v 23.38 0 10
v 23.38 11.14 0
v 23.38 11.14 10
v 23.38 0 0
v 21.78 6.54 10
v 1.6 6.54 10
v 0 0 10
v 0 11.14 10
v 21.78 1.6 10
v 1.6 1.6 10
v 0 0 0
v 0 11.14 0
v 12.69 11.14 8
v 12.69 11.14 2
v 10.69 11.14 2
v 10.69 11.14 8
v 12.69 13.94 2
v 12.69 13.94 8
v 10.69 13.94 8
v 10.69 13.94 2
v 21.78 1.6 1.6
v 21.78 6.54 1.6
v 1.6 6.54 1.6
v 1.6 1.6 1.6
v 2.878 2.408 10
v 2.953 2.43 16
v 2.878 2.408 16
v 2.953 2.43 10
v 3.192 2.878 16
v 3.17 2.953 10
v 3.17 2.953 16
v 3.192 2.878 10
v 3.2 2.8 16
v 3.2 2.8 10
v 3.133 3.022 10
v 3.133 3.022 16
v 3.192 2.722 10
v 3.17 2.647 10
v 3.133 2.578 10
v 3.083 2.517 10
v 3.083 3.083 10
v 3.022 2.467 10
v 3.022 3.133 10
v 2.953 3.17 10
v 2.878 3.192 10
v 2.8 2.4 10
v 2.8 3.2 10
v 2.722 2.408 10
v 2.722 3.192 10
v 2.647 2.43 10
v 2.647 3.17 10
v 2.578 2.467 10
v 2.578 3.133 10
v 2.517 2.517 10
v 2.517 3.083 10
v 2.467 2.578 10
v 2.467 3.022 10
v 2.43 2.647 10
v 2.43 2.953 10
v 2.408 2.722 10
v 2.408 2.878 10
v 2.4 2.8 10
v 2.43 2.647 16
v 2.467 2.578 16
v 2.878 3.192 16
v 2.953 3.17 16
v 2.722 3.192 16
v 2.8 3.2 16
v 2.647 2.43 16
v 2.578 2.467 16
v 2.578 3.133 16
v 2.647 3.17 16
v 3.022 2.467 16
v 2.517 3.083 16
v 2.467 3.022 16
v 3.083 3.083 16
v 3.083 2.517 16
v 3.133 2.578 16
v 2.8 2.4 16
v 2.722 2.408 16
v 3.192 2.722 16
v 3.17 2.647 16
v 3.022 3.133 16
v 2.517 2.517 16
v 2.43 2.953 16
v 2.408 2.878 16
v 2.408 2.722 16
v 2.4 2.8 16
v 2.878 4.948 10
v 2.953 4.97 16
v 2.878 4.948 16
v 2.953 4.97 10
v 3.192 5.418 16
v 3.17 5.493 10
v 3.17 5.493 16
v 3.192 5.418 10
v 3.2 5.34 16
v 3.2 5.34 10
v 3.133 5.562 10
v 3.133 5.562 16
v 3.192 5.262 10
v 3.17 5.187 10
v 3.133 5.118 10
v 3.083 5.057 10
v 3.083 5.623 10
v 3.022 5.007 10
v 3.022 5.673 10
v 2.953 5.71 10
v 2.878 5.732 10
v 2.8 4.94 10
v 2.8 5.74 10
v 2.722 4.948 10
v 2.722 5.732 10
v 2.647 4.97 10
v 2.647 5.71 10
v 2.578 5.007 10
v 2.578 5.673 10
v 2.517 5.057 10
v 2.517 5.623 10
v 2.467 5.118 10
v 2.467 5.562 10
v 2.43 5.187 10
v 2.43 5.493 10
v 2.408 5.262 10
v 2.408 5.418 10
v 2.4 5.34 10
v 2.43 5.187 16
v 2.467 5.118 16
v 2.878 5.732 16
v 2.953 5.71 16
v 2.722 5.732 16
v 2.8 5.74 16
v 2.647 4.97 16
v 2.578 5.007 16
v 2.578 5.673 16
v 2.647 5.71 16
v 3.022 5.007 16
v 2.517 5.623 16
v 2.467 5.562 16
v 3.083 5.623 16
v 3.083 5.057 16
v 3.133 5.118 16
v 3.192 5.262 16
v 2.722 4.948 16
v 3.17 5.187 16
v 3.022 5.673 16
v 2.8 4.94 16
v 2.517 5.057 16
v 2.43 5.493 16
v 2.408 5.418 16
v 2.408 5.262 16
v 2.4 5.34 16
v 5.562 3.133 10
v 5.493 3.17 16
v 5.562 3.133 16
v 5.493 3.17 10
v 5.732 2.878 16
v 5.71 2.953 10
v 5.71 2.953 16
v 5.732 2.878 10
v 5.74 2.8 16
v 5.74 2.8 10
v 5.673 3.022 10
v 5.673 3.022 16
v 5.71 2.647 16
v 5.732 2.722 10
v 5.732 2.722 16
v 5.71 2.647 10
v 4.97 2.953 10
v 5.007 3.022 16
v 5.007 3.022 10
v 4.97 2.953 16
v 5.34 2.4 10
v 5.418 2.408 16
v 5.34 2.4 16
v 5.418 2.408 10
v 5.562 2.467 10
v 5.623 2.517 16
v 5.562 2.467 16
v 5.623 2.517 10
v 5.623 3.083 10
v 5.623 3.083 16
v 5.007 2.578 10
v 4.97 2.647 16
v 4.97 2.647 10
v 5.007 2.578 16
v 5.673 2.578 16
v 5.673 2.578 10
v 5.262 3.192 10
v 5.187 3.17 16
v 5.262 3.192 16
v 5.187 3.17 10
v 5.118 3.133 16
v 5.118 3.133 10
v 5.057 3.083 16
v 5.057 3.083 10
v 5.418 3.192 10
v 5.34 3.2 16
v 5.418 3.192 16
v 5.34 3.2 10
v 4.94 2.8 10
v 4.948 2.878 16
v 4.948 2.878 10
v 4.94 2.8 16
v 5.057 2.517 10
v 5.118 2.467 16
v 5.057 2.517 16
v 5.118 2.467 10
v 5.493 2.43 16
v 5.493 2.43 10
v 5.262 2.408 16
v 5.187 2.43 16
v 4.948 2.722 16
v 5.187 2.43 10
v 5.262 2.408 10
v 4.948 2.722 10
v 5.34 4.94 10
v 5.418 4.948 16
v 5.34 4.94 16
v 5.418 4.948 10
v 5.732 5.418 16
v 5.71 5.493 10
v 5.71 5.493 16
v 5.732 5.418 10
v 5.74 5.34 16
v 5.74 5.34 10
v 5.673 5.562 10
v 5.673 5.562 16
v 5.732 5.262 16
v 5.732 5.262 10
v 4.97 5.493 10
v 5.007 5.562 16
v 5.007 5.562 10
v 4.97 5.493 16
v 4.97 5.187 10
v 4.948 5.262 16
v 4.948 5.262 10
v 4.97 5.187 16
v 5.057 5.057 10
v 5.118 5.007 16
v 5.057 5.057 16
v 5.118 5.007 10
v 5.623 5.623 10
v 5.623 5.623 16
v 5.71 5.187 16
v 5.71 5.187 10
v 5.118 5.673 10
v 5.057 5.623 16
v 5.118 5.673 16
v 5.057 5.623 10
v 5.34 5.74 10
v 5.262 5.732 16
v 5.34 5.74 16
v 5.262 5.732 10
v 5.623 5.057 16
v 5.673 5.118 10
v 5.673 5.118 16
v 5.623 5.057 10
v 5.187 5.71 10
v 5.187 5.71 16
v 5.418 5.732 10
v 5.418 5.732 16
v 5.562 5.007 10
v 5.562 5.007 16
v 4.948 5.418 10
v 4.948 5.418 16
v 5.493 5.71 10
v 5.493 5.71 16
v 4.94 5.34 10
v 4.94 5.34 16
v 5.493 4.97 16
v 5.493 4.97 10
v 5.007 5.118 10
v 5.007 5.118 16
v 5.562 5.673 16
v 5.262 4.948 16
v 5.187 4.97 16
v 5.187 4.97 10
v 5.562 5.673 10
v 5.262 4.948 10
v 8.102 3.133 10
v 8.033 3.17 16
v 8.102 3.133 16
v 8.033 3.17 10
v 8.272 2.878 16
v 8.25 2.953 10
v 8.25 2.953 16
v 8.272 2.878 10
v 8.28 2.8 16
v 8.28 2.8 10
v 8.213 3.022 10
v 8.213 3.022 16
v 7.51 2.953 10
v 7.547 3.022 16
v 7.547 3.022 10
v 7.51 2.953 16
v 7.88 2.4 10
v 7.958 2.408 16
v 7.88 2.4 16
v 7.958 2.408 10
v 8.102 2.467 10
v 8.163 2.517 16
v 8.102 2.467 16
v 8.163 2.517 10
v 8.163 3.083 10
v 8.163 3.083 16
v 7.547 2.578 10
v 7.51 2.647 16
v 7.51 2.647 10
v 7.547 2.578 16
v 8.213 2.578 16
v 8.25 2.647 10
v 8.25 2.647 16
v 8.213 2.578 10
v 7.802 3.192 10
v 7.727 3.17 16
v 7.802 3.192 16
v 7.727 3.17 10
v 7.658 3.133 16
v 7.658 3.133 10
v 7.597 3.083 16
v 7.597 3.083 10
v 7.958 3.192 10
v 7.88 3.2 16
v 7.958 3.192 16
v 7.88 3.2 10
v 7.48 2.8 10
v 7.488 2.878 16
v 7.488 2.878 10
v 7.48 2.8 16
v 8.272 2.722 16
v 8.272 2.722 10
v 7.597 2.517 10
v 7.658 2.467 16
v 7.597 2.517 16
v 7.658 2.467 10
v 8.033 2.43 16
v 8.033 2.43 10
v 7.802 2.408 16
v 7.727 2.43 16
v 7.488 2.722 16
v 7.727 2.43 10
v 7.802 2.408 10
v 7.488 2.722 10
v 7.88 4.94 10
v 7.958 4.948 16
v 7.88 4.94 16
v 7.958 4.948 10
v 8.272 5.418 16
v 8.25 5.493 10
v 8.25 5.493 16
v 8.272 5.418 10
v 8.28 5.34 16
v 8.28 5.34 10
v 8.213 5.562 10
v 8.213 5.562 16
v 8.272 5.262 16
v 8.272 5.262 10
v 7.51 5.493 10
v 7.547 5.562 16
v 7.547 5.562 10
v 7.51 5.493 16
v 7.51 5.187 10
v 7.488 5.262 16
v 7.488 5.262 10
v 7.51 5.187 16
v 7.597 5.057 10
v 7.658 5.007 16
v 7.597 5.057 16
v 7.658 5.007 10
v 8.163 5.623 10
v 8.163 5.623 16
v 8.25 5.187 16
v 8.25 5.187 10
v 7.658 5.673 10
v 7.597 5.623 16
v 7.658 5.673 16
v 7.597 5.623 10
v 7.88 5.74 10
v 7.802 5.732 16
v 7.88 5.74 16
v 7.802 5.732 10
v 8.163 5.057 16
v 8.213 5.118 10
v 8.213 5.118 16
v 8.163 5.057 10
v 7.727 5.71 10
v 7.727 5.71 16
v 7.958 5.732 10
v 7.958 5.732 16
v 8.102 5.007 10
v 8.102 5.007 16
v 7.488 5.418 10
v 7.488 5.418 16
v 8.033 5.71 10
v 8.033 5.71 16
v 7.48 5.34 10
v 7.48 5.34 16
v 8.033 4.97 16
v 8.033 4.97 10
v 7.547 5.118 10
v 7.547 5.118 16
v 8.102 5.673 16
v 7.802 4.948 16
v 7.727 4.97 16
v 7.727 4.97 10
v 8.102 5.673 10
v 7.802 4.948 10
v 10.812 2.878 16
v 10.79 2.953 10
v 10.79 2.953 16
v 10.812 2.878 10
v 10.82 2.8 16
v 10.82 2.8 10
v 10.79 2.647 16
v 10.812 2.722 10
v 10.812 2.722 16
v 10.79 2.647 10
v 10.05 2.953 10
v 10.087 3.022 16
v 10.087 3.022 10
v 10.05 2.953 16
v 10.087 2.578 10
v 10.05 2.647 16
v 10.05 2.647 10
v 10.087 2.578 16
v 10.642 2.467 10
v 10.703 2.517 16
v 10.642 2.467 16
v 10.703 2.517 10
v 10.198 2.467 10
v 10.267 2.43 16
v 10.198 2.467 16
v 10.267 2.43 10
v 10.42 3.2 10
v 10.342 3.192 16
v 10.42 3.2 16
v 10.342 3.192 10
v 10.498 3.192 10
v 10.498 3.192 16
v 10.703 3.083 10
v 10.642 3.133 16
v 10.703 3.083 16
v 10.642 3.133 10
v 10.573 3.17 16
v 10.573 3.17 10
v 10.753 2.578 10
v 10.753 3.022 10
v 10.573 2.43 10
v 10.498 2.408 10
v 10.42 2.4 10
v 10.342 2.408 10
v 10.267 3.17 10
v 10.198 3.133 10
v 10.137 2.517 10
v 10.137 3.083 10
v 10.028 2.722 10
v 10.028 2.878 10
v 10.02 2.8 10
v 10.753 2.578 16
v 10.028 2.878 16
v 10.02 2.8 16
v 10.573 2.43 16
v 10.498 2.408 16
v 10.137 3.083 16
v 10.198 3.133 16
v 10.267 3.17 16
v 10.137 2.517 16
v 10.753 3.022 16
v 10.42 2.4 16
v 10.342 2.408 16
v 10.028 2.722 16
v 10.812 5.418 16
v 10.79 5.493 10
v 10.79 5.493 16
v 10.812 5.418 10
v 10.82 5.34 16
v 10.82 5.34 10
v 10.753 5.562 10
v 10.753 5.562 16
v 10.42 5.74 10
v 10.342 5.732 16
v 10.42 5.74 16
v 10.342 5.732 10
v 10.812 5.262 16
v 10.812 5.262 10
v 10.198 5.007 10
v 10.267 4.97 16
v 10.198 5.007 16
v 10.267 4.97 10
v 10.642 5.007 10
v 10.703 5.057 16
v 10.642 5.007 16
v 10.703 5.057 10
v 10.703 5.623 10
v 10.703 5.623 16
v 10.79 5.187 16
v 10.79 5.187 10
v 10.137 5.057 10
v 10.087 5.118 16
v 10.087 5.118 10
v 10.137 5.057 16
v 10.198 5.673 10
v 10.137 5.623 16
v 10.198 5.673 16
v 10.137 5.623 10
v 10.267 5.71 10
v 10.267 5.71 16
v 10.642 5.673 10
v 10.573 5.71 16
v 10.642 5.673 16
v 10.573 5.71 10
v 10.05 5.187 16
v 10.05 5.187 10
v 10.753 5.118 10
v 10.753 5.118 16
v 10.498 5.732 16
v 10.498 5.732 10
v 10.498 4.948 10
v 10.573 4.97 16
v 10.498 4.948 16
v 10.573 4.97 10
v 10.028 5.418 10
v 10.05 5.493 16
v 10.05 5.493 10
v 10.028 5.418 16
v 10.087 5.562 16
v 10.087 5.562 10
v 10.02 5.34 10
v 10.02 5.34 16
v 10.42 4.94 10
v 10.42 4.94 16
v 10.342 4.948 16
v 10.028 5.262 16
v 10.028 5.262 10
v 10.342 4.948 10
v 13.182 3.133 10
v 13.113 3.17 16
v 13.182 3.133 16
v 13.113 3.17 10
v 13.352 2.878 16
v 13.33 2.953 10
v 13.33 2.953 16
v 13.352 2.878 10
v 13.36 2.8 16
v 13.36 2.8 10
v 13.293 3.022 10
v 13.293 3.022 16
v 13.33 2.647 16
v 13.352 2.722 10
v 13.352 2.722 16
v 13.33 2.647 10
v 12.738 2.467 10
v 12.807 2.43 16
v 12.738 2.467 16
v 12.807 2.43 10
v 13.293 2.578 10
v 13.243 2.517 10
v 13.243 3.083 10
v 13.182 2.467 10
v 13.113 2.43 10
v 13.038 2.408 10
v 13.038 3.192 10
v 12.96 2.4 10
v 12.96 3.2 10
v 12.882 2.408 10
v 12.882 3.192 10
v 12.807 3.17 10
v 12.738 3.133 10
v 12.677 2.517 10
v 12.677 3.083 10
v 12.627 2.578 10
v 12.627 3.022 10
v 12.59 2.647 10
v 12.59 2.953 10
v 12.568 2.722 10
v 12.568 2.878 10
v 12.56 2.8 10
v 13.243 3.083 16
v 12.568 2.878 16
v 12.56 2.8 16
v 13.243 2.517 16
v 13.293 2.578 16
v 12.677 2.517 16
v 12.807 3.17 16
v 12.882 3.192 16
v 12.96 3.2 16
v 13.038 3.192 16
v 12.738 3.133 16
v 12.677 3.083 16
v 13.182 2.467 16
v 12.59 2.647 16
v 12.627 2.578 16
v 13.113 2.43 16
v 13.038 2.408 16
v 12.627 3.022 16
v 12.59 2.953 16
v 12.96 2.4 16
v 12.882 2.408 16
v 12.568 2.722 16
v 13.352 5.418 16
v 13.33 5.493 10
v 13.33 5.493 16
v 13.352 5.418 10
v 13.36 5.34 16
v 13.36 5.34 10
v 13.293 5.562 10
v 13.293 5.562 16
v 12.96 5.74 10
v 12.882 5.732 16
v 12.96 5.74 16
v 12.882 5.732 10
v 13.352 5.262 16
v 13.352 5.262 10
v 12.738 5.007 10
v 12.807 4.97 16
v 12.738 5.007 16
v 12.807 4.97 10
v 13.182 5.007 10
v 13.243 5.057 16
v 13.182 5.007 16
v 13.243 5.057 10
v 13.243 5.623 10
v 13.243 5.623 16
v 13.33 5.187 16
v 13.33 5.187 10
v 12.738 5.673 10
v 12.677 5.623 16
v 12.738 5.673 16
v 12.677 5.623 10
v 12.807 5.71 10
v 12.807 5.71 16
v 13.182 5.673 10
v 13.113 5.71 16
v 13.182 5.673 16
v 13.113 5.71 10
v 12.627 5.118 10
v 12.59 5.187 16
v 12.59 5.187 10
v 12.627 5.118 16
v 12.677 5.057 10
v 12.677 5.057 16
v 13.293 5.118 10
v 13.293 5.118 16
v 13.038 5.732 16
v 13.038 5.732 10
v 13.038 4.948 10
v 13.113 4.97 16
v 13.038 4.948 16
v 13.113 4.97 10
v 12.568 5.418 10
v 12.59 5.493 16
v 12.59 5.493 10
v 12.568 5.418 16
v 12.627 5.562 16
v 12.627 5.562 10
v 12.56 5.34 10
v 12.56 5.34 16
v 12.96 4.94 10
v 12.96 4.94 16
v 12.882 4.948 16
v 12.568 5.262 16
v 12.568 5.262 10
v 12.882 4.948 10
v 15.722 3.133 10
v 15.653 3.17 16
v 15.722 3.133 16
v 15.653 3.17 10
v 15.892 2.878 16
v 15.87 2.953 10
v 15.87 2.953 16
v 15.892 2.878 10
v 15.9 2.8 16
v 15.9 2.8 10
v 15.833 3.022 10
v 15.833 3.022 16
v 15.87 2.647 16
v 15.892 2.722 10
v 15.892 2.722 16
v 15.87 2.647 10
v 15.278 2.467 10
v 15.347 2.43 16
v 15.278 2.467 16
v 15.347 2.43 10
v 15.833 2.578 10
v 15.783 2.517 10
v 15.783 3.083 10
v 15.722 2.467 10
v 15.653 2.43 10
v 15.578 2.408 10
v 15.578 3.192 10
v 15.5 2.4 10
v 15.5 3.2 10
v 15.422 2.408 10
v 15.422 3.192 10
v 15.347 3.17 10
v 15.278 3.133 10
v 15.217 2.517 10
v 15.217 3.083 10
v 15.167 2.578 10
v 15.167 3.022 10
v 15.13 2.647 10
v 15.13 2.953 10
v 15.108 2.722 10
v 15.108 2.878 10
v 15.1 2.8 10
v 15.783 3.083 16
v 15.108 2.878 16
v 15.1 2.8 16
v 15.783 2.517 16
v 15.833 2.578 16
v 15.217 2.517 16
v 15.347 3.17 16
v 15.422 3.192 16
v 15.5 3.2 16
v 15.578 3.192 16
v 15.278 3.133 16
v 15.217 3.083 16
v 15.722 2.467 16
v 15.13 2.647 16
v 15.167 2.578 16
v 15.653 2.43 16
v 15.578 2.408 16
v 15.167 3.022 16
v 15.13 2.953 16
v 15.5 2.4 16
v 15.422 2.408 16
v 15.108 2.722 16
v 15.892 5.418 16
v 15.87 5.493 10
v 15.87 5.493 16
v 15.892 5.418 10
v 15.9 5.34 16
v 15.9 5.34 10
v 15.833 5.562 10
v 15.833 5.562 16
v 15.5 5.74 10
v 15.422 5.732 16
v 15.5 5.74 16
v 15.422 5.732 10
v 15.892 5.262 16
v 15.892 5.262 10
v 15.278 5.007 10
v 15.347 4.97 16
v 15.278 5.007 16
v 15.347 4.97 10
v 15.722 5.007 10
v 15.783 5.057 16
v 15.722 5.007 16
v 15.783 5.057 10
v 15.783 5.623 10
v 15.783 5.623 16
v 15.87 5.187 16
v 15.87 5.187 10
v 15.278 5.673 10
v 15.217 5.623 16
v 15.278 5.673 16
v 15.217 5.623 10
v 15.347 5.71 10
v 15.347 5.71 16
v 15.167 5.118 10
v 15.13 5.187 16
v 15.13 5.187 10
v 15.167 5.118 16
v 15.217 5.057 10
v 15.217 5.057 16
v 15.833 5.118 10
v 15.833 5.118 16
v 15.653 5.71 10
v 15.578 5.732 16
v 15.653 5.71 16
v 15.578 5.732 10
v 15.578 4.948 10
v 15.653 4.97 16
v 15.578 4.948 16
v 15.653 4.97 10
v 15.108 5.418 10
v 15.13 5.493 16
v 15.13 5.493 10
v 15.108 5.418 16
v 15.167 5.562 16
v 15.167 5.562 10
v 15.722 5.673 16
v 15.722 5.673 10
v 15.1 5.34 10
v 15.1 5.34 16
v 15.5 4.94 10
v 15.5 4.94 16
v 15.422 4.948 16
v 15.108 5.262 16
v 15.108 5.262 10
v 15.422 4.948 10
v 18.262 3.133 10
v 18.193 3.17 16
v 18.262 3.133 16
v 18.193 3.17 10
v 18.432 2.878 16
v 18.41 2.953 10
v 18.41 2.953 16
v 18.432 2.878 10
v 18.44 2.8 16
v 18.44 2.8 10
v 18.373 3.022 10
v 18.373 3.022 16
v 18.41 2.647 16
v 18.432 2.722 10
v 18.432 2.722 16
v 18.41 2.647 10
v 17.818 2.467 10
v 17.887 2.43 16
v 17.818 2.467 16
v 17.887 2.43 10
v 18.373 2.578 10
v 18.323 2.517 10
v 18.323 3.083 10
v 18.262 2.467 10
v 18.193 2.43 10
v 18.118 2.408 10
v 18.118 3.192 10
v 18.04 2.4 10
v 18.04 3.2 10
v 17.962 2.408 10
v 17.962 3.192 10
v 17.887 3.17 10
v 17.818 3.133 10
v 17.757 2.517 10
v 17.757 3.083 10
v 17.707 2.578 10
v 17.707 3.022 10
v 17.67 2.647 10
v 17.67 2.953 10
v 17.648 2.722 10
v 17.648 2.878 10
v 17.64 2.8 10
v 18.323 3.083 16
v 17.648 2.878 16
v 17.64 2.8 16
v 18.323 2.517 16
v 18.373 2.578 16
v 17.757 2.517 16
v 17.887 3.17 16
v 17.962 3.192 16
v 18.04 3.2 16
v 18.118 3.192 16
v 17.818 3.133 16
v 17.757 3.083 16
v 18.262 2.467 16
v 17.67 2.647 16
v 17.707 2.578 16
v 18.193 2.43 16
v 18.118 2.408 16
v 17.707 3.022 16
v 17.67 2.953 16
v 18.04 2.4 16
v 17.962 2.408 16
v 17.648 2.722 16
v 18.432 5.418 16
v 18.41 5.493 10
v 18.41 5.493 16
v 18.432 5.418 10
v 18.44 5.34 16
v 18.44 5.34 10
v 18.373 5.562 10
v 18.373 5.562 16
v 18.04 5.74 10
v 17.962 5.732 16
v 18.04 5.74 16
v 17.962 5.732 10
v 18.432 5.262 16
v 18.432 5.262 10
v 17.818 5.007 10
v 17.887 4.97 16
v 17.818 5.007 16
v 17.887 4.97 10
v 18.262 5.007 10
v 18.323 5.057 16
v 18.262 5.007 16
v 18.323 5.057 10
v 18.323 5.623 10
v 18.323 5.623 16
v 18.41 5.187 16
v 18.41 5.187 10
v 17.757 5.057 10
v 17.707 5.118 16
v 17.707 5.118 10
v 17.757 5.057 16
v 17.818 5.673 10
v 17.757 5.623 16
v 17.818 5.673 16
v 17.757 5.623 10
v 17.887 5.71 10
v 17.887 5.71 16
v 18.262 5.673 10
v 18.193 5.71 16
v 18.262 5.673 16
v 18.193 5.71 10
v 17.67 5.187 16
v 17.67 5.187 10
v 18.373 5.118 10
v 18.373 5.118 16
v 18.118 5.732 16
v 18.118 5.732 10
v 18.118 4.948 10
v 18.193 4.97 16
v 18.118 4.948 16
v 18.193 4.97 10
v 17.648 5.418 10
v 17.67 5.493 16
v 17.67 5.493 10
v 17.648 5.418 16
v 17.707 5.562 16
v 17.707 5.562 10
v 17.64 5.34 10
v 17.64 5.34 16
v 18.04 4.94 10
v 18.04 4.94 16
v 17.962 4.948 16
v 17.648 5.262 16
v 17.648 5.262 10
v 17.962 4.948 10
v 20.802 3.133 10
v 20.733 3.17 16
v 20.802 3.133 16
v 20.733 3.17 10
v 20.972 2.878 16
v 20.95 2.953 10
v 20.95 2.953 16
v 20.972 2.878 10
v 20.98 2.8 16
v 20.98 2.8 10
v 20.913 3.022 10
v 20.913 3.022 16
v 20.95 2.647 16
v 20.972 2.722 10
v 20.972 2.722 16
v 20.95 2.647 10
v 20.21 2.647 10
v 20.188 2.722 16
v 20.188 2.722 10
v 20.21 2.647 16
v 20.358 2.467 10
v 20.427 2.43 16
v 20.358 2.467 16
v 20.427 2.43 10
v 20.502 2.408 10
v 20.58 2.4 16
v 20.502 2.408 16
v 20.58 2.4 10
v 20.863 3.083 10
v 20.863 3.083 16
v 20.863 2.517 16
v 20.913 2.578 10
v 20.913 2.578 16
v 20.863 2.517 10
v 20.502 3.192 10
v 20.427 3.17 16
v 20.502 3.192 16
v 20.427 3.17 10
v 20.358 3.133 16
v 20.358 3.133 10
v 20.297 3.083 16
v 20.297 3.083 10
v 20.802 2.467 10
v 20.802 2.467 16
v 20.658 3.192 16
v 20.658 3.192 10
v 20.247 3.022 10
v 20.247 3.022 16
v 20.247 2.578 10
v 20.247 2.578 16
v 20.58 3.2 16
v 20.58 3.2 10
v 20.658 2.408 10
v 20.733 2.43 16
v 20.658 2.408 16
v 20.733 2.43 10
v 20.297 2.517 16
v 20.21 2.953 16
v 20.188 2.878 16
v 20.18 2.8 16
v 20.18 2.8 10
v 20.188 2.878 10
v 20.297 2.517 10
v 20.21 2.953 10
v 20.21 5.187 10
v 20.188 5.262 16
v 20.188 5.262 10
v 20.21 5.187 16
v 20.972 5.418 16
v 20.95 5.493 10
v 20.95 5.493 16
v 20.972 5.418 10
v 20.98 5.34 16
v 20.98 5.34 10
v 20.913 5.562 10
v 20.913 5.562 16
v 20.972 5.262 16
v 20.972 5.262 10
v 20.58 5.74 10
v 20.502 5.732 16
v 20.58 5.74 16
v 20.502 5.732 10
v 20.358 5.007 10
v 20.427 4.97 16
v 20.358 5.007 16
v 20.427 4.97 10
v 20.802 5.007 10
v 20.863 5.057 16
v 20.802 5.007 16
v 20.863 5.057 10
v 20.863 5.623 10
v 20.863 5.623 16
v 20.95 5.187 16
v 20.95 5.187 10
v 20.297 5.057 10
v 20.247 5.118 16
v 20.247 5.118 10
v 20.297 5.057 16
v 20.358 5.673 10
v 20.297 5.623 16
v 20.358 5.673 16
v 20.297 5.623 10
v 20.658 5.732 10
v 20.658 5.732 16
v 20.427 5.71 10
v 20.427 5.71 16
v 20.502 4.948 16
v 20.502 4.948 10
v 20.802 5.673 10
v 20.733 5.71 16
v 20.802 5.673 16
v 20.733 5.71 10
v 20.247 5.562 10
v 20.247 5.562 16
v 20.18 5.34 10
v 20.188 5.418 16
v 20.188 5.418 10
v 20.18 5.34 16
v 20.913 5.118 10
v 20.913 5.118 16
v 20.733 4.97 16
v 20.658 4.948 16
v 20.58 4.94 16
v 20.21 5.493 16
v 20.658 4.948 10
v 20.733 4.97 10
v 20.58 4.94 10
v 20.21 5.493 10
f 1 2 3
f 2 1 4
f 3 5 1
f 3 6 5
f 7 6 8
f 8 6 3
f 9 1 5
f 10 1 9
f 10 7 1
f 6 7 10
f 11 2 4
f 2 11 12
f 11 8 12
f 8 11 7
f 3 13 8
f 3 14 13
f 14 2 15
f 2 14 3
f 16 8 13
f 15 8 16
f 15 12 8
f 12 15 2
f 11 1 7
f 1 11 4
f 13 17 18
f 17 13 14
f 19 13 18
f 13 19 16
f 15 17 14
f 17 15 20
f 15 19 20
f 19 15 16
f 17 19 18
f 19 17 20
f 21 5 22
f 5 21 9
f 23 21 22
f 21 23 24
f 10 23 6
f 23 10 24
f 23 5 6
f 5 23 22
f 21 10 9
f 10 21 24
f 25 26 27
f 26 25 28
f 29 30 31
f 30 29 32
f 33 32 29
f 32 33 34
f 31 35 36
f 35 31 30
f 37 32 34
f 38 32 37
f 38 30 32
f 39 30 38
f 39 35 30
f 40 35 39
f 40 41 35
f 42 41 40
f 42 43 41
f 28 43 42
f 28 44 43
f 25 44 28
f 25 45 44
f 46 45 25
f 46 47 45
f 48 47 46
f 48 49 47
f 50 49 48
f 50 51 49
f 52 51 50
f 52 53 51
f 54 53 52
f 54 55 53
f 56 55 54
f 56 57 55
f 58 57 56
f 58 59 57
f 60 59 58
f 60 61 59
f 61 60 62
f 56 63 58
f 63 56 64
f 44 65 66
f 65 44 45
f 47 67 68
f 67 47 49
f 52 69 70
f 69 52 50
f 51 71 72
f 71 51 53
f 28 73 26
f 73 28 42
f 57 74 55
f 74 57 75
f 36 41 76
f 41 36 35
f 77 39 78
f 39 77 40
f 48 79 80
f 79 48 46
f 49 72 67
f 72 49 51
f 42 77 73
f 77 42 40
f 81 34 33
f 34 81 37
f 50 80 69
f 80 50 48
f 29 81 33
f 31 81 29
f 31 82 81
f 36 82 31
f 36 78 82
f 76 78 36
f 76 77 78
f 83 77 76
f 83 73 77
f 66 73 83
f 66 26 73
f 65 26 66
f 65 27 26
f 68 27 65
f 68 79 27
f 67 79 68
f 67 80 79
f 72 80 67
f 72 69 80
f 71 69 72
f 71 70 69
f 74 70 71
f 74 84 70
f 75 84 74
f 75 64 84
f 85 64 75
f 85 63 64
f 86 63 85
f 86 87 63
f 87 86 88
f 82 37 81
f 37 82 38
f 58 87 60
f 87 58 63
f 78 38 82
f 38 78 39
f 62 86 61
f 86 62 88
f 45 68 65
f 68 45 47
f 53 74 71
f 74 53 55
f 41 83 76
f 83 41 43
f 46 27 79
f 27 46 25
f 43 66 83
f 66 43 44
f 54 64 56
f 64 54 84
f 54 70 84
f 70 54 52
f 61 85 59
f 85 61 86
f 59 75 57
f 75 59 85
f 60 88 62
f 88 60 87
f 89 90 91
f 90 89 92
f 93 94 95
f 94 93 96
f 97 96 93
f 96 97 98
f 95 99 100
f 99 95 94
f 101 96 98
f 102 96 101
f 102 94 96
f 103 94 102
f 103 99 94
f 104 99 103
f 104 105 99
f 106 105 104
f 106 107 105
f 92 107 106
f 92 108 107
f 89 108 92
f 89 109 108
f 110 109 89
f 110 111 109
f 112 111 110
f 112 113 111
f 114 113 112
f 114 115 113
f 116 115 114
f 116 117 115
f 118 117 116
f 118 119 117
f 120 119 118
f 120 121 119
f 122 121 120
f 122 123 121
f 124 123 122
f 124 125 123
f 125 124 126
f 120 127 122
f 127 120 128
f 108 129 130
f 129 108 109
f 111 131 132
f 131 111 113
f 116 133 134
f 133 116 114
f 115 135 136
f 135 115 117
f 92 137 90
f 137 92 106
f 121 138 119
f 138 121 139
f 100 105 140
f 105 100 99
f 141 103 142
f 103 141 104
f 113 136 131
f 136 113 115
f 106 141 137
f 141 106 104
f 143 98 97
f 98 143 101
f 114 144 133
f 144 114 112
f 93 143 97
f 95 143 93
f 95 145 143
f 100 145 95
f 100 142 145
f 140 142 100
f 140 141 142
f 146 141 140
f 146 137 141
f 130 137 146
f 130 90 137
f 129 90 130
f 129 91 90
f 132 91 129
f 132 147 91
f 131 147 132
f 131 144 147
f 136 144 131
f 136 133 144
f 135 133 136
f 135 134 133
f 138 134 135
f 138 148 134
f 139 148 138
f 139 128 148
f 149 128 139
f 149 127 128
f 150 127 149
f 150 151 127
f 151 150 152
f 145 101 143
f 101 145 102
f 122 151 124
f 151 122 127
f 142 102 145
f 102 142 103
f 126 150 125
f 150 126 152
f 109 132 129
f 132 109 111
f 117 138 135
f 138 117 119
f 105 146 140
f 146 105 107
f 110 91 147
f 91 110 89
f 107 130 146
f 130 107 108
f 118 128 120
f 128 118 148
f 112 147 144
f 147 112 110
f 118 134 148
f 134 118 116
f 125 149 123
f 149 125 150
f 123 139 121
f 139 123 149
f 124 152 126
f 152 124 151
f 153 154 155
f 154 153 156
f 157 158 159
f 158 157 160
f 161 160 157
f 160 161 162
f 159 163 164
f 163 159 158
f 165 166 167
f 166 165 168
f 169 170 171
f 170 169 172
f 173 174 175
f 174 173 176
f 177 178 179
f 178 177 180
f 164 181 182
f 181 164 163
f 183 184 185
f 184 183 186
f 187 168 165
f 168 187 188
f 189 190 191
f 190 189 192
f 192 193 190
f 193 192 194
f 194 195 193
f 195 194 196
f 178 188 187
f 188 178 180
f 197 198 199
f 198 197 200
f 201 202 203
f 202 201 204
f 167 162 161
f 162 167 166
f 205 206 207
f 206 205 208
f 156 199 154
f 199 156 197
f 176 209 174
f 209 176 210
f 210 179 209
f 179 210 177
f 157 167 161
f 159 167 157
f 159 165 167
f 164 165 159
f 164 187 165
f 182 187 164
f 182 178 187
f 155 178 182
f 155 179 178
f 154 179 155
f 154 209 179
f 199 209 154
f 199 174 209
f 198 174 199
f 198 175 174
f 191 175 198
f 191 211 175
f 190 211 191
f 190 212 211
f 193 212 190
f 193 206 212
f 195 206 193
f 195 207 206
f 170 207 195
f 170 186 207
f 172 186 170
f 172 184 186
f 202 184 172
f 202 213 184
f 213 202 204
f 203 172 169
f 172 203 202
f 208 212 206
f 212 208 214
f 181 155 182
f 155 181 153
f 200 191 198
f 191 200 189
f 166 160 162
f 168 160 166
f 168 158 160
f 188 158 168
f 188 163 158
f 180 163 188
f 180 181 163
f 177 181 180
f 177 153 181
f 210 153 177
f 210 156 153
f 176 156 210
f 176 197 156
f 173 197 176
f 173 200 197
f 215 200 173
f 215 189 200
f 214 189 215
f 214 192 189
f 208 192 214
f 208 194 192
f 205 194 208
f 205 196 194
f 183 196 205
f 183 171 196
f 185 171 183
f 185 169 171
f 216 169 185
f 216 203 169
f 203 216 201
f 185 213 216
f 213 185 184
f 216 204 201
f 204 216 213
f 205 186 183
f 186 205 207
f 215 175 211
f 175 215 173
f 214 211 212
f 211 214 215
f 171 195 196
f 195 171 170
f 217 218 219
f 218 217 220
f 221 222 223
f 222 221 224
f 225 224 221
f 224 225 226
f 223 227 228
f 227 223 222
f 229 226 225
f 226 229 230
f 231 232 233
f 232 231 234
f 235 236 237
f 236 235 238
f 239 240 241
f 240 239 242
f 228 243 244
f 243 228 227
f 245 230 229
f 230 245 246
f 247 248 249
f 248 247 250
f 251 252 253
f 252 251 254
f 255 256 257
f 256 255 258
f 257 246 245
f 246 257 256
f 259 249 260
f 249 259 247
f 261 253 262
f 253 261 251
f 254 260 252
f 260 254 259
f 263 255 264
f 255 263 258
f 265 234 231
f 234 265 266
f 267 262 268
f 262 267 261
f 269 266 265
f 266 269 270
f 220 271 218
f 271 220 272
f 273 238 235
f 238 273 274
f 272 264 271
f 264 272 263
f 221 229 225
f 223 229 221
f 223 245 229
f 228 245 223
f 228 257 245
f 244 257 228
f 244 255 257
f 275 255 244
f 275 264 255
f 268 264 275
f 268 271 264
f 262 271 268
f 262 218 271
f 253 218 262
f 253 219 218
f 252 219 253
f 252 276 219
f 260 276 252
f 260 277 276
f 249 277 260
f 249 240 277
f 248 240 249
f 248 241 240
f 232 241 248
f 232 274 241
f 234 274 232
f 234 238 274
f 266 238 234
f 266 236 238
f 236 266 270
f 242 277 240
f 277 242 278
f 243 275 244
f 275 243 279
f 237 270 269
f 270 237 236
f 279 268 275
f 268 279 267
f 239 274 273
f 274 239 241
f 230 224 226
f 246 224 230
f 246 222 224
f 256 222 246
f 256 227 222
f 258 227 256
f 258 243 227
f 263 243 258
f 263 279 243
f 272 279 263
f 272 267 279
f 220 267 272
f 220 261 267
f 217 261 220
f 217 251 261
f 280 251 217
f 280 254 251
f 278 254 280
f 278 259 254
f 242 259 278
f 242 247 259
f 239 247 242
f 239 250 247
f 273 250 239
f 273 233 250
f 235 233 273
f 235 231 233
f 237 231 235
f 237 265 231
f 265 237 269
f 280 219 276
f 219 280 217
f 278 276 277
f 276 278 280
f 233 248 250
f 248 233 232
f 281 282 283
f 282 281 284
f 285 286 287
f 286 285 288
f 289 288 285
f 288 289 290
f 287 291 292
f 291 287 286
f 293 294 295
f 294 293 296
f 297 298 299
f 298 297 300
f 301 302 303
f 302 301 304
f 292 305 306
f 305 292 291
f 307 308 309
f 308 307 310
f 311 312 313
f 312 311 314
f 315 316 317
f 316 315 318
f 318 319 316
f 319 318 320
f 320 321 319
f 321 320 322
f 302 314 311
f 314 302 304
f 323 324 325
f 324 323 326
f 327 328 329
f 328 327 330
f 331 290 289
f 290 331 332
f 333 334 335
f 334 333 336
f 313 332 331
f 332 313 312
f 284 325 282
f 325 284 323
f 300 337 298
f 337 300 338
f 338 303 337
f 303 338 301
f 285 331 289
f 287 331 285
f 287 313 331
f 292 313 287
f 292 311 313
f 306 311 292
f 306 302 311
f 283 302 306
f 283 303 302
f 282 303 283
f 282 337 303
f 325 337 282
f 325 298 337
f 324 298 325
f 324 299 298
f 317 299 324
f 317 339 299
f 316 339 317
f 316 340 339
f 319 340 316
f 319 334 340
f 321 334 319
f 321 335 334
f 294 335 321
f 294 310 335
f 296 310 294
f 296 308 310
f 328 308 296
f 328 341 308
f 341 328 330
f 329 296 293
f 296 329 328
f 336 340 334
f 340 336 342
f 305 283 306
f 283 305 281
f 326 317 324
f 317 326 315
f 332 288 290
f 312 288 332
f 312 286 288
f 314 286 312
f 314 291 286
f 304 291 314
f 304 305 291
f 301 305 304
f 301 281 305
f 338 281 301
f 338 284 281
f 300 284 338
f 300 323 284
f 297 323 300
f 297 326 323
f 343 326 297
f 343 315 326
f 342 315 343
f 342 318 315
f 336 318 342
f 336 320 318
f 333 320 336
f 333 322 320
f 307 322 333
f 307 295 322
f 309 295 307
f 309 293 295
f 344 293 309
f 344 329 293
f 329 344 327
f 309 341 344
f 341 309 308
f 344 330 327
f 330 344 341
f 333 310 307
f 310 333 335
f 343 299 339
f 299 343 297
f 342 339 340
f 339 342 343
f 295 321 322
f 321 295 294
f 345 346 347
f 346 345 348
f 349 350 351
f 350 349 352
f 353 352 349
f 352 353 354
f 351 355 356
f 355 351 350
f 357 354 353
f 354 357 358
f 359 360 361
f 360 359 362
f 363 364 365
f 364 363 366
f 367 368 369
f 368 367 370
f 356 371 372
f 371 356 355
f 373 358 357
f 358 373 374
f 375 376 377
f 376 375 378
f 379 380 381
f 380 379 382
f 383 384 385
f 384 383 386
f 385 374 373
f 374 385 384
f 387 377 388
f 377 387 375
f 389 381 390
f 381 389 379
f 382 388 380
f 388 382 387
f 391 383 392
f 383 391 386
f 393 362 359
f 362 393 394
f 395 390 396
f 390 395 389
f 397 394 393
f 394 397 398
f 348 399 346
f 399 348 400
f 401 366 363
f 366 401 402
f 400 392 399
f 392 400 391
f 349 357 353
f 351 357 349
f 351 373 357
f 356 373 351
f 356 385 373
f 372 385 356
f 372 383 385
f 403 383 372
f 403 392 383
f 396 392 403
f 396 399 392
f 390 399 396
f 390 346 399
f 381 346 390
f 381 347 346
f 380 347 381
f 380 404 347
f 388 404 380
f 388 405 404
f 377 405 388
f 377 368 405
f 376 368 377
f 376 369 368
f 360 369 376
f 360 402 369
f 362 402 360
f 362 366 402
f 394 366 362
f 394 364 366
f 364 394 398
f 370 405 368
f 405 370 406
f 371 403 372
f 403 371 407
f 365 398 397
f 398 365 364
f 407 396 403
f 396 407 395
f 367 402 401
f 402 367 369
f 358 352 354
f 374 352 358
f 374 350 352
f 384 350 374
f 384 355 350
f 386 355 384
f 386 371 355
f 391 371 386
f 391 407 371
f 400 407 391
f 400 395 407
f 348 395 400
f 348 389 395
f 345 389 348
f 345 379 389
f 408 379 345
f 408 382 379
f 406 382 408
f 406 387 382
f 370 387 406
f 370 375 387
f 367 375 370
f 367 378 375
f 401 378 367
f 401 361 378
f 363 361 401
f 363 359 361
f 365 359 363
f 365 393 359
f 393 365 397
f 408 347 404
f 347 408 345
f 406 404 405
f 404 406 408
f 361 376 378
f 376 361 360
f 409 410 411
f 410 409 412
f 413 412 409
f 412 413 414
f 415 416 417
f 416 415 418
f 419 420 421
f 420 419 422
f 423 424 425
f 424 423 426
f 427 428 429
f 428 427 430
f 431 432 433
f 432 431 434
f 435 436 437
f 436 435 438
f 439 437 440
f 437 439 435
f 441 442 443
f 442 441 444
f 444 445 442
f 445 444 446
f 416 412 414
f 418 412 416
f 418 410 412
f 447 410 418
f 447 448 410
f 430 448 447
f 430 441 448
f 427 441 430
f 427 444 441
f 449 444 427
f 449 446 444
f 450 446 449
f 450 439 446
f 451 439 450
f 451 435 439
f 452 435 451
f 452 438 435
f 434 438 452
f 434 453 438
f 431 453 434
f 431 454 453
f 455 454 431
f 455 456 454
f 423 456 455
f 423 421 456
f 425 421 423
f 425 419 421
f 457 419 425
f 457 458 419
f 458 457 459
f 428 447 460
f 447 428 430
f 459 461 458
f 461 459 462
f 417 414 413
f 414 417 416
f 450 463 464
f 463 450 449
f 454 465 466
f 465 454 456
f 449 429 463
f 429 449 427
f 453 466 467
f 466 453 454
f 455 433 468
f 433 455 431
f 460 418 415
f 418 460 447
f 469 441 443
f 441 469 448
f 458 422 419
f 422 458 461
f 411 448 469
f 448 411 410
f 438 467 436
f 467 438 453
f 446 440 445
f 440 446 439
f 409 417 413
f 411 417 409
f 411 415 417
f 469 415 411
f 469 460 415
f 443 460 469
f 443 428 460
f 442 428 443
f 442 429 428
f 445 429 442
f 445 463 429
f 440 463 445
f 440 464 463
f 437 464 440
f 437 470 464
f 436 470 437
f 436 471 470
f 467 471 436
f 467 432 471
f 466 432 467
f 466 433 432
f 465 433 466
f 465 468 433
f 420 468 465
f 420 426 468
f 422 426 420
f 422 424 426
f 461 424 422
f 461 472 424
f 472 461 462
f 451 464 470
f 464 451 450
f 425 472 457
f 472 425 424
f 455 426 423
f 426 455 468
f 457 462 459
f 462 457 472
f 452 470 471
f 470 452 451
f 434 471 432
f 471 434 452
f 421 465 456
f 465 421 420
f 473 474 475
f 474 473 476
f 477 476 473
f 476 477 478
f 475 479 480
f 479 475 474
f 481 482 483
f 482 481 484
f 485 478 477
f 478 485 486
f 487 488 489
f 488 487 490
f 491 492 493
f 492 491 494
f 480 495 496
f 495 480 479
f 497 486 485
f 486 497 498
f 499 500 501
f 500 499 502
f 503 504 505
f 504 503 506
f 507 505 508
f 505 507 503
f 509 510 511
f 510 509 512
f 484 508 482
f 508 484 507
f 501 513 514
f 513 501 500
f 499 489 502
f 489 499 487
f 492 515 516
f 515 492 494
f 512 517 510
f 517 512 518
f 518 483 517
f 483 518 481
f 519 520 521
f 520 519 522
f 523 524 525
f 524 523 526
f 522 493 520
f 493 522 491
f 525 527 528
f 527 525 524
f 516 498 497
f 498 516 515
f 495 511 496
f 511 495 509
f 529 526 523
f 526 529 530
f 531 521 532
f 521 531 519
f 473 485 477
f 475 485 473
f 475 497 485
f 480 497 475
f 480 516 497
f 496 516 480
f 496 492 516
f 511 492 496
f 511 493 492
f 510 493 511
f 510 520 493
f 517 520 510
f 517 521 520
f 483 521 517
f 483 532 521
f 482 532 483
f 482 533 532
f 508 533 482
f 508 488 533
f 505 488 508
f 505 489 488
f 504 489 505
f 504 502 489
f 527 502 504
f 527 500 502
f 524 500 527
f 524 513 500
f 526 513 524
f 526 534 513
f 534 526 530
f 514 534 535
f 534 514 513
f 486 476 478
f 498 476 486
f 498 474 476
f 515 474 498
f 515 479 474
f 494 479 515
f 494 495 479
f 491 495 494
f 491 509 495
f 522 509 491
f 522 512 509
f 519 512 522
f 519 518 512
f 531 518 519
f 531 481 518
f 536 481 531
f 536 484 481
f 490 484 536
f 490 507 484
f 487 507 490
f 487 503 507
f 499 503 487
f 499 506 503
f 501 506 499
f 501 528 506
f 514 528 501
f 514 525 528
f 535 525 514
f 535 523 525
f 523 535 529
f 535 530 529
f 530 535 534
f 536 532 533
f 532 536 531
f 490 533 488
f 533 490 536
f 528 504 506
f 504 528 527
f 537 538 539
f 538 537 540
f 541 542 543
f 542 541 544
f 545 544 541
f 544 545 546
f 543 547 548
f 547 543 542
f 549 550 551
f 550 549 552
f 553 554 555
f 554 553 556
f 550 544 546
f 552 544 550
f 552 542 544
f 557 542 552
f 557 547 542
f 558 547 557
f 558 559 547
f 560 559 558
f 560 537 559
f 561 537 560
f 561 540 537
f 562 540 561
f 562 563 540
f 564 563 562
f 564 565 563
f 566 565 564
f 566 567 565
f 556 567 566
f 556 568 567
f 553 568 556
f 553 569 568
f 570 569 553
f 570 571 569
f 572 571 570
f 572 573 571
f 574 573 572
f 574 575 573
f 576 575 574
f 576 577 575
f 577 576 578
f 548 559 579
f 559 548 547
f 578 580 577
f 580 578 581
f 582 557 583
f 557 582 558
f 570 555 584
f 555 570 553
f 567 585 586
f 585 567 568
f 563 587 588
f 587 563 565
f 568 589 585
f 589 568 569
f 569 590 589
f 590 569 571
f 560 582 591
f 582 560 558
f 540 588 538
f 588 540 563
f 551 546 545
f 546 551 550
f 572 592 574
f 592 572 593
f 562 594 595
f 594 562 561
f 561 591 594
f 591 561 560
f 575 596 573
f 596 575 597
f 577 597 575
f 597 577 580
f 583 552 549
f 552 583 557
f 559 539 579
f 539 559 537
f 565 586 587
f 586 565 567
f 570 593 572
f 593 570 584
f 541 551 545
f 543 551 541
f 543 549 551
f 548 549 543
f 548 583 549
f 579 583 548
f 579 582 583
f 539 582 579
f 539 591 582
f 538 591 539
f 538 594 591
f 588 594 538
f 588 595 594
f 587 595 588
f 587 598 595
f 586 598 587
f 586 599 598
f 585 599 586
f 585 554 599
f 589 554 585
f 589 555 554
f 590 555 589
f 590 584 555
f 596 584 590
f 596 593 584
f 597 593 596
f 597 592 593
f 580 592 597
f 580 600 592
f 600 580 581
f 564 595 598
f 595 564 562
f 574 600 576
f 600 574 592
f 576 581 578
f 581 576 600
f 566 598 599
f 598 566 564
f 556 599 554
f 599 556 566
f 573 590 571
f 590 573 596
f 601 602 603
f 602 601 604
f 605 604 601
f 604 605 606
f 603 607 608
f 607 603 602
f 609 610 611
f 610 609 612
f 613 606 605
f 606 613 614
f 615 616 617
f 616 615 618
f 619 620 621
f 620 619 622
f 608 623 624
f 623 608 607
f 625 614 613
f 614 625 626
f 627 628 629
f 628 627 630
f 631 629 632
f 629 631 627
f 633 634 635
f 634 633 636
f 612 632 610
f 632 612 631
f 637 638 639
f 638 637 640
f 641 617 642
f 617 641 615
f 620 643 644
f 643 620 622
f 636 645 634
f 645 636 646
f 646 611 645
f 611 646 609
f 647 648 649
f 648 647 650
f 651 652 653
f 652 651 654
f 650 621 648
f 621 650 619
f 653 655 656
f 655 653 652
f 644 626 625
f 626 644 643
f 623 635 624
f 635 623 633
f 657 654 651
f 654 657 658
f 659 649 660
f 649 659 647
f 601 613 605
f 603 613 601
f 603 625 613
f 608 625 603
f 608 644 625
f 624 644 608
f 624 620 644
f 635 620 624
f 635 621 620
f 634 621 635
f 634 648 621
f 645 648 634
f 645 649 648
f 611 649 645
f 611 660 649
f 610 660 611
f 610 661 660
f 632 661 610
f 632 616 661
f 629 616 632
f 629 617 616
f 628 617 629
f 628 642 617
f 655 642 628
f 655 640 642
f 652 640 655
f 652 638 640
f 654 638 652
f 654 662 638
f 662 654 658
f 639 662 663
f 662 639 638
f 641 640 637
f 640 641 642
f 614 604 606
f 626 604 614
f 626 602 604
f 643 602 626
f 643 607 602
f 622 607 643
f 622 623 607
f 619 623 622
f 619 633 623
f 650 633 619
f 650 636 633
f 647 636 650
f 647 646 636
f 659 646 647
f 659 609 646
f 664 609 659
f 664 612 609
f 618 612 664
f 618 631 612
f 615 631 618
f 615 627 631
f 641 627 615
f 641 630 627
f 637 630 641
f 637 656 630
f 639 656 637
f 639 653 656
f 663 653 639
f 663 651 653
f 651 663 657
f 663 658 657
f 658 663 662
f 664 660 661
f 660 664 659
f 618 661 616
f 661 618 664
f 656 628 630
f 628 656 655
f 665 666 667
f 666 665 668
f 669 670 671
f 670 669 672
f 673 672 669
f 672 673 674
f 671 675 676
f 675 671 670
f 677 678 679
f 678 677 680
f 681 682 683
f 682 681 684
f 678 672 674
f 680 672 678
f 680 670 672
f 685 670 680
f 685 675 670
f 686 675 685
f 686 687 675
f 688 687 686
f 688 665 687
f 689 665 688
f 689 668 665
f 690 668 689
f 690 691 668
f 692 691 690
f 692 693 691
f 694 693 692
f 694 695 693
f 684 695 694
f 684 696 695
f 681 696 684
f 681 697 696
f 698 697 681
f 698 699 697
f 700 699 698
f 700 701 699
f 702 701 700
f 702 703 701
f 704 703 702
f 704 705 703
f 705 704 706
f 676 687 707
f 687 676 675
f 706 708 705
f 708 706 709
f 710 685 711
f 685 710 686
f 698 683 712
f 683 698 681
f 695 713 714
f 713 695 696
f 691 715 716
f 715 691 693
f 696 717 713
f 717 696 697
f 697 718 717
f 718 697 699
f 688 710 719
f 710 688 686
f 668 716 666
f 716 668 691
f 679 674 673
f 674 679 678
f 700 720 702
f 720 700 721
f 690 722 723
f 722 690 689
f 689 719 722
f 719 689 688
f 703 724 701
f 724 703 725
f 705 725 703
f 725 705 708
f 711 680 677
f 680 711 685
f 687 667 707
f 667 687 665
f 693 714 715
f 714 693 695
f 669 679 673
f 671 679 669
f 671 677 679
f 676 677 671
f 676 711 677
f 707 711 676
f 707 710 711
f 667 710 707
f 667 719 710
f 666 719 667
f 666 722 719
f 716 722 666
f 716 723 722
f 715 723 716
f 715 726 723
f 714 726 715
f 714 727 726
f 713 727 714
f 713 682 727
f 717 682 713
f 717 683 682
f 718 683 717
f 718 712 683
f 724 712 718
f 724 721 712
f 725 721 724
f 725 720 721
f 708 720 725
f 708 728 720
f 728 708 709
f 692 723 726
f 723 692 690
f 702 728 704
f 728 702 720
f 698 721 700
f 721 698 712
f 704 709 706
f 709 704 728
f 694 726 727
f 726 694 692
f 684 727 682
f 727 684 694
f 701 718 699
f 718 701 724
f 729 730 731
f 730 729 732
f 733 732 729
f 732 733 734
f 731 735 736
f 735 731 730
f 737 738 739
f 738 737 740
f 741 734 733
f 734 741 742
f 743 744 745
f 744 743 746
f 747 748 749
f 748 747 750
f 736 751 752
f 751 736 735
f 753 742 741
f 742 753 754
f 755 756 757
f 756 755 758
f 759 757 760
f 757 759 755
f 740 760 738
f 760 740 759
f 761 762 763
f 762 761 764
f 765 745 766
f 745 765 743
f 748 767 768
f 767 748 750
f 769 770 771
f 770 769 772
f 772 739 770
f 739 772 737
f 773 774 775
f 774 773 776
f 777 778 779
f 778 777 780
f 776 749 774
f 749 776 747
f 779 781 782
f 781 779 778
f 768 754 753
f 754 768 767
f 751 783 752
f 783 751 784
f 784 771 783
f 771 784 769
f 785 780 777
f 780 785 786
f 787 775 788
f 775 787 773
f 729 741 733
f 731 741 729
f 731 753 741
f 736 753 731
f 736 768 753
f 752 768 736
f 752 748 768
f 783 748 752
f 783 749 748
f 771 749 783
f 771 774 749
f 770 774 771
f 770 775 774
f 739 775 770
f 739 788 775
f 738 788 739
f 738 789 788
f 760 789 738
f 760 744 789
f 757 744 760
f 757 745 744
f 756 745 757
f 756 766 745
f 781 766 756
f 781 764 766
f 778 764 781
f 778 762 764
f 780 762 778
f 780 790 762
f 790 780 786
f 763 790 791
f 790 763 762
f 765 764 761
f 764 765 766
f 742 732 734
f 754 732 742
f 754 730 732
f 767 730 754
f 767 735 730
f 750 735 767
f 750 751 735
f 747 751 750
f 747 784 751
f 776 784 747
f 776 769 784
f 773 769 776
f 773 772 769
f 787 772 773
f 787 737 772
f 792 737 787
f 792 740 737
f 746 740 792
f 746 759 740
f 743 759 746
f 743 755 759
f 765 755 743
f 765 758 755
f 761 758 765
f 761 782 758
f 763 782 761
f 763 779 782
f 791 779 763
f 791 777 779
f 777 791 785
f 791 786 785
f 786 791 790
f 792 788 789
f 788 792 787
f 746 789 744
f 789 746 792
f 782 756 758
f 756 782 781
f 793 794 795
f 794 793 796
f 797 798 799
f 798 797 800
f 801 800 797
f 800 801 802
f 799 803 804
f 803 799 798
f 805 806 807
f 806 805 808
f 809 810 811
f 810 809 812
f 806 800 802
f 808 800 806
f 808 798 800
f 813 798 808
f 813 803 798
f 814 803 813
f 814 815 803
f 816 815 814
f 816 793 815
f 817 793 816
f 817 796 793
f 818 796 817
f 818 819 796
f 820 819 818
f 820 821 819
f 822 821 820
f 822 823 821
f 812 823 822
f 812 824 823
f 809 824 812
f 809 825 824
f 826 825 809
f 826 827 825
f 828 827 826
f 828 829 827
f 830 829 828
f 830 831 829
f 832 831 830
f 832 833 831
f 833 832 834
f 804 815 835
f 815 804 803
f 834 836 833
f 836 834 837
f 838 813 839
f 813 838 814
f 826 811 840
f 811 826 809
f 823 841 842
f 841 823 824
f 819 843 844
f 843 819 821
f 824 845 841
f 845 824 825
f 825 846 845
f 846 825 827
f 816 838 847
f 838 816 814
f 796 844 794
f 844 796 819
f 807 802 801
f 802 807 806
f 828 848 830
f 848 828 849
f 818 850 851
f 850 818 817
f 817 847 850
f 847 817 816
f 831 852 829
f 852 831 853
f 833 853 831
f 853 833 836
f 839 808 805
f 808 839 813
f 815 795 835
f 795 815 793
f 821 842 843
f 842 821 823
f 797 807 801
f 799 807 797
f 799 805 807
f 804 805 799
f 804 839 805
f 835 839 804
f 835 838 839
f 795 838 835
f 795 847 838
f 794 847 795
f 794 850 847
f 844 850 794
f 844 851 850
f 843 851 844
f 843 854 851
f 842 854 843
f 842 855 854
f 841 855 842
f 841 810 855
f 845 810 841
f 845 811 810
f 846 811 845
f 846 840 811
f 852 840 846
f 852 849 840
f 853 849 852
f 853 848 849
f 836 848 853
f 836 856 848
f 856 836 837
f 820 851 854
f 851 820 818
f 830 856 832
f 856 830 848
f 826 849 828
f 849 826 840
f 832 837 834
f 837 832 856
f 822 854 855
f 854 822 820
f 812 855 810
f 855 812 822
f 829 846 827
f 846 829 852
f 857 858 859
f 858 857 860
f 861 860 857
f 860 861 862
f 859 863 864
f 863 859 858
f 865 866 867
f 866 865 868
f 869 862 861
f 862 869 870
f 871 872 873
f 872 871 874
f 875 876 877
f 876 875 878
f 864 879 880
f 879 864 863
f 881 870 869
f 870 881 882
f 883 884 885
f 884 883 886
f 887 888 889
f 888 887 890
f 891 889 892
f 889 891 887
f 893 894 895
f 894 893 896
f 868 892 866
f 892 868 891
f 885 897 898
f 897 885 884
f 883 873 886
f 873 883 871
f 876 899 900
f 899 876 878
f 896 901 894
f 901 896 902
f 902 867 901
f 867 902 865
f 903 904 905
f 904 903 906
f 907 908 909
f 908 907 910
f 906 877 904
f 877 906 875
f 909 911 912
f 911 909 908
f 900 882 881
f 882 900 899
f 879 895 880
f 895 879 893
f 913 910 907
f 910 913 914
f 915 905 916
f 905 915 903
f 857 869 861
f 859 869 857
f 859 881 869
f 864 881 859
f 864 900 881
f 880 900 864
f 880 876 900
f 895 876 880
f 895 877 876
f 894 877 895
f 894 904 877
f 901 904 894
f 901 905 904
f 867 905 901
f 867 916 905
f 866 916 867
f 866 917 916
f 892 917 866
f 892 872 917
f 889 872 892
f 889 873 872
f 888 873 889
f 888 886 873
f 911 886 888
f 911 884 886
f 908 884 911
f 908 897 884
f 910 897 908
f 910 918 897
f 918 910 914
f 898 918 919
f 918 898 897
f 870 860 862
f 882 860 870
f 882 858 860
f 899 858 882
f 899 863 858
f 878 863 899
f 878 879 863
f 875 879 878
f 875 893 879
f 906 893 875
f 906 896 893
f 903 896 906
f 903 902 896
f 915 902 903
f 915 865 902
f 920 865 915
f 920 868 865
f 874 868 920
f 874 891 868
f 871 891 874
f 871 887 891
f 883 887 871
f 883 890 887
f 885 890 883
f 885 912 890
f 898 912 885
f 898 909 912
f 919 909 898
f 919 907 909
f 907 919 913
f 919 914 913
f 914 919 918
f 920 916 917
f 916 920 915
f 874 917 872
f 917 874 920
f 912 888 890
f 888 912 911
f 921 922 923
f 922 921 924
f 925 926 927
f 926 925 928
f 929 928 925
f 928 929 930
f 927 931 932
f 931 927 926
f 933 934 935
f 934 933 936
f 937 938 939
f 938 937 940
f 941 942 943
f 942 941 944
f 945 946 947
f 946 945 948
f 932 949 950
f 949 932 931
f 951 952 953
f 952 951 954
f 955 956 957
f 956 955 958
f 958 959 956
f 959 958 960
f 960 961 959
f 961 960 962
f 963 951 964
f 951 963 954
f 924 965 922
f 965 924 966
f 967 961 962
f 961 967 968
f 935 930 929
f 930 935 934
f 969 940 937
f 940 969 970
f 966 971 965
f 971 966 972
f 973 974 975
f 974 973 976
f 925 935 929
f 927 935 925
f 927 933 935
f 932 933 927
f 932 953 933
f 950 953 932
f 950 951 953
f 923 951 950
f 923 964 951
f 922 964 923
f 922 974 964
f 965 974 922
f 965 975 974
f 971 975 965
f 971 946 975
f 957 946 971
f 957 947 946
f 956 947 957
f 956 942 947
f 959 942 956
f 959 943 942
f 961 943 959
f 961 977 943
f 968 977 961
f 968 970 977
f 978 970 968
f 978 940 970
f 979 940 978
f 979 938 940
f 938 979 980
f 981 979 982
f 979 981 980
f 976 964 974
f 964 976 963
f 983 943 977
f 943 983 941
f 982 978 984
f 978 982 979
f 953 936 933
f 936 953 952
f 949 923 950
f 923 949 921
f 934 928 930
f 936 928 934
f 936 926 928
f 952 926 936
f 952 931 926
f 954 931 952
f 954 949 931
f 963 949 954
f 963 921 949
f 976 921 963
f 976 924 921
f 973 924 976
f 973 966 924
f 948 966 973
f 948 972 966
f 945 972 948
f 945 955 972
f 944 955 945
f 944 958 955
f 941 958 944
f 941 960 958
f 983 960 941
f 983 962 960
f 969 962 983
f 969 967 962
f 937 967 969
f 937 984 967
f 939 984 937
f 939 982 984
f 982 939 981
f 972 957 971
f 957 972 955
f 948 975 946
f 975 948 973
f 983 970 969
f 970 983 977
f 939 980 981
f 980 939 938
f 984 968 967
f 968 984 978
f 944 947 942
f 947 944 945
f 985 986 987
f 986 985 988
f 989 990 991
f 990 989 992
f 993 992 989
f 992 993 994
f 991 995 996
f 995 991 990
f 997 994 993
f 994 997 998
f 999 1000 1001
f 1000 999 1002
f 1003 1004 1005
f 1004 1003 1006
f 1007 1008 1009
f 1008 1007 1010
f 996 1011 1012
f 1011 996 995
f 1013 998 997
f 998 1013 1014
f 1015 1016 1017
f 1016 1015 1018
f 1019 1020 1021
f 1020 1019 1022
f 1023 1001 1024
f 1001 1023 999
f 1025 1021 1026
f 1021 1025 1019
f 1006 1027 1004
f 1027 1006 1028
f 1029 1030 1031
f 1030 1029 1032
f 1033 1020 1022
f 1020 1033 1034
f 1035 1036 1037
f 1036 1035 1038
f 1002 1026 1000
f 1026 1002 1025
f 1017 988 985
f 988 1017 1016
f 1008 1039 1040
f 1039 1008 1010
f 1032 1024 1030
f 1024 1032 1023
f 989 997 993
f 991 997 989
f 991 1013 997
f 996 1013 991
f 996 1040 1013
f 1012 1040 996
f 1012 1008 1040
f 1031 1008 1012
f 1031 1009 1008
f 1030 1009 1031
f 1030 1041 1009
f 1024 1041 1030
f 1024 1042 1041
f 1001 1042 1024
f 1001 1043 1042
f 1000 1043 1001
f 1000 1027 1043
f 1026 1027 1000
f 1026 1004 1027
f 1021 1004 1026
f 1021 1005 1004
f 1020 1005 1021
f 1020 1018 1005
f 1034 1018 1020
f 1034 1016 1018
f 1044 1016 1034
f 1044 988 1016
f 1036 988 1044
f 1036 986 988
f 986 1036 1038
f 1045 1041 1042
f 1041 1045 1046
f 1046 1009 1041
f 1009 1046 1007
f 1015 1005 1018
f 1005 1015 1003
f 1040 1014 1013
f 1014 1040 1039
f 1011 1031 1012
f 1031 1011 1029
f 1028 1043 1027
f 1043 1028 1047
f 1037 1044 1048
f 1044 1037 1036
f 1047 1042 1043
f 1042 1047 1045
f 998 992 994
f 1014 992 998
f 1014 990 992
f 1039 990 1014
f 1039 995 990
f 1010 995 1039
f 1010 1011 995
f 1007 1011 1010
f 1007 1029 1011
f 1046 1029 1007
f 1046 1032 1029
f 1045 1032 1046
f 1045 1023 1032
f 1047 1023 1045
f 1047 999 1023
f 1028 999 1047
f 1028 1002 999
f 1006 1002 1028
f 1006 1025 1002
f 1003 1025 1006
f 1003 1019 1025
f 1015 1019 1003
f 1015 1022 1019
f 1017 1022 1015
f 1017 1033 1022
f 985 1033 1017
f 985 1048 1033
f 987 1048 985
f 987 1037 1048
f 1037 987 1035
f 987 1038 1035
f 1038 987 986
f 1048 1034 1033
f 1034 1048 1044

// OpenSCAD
// =============================================================================
// PLACEHOLDER — generic male multi-pin SHELL
// =============================================================================
// TODO: pitch unknown until callipers.
// TODO: pin count, row spacing, keying, latch, and wire gauge unknown.
//
// This is NOT an AP1 drop-in. Honda cluster / engine-bay connectors are
// specific housings. Do not crimp this against a factory harness.
//
// Bay / plug callipers are REQUIRED before any print that touches the car.
// Print in PETG or ASA. Do NOT use PLA in the cabin.
// =============================================================================

$fn = 32;

// --- guessed geometry (WRONG until measured) --------------------------------
// Default 2.54 mm is a hobby pitch, almost certainly not the AP1 connector.
pin_pitch = 2.54;       // TODO: pitch unknown until callipers
rows = 2;
cols = 8;
pin_d = 0.8;            // TODO: pin diameter unknown
pin_len = 6.0;
row_pitch = 2.54;       // TODO: row spacing unknown

wall = 1.6;
cavity_extra = 1.2;
body_h = 10.0;
polarizer_w = 2.0;
polarizer_h = 3.0;

grid_w = (cols - 1) * pin_pitch;
grid_h = (rows - 1) * row_pitch;
body_w = grid_w + 2 * cavity_extra + 2 * wall;
body_d = grid_h + 2 * cavity_extra + 2 * wall + polarizer_h;

module pin_at(c, r) {
    translate([
        wall + cavity_extra + c * pin_pitch,
        wall + cavity_extra + r * row_pitch,
        body_h
    ])
        cylinder(h = pin_len, d = pin_d);
}

module male_shell() {
    difference() {
        union() {
            cube([body_w, body_d, body_h]);
            // Polarizing rib — SIDE UNKNOWN until the real plug is measured
            translate([body_w / 2 - polarizer_w / 2, body_d - 0.2, 2])
                cube([polarizer_w, polarizer_h, body_h - 4]);
        }
        // Cavity so this looks like a shell, not a solid brick
        translate([wall, wall, wall])
            cube([
                body_w - 2 * wall,
                body_d - 2 * wall - polarizer_h,
                body_h
            ]);
    }

    for (c = [0 : cols - 1], r = [0 : rows - 1])
        pin_at(c, r);
}

male_shell();
